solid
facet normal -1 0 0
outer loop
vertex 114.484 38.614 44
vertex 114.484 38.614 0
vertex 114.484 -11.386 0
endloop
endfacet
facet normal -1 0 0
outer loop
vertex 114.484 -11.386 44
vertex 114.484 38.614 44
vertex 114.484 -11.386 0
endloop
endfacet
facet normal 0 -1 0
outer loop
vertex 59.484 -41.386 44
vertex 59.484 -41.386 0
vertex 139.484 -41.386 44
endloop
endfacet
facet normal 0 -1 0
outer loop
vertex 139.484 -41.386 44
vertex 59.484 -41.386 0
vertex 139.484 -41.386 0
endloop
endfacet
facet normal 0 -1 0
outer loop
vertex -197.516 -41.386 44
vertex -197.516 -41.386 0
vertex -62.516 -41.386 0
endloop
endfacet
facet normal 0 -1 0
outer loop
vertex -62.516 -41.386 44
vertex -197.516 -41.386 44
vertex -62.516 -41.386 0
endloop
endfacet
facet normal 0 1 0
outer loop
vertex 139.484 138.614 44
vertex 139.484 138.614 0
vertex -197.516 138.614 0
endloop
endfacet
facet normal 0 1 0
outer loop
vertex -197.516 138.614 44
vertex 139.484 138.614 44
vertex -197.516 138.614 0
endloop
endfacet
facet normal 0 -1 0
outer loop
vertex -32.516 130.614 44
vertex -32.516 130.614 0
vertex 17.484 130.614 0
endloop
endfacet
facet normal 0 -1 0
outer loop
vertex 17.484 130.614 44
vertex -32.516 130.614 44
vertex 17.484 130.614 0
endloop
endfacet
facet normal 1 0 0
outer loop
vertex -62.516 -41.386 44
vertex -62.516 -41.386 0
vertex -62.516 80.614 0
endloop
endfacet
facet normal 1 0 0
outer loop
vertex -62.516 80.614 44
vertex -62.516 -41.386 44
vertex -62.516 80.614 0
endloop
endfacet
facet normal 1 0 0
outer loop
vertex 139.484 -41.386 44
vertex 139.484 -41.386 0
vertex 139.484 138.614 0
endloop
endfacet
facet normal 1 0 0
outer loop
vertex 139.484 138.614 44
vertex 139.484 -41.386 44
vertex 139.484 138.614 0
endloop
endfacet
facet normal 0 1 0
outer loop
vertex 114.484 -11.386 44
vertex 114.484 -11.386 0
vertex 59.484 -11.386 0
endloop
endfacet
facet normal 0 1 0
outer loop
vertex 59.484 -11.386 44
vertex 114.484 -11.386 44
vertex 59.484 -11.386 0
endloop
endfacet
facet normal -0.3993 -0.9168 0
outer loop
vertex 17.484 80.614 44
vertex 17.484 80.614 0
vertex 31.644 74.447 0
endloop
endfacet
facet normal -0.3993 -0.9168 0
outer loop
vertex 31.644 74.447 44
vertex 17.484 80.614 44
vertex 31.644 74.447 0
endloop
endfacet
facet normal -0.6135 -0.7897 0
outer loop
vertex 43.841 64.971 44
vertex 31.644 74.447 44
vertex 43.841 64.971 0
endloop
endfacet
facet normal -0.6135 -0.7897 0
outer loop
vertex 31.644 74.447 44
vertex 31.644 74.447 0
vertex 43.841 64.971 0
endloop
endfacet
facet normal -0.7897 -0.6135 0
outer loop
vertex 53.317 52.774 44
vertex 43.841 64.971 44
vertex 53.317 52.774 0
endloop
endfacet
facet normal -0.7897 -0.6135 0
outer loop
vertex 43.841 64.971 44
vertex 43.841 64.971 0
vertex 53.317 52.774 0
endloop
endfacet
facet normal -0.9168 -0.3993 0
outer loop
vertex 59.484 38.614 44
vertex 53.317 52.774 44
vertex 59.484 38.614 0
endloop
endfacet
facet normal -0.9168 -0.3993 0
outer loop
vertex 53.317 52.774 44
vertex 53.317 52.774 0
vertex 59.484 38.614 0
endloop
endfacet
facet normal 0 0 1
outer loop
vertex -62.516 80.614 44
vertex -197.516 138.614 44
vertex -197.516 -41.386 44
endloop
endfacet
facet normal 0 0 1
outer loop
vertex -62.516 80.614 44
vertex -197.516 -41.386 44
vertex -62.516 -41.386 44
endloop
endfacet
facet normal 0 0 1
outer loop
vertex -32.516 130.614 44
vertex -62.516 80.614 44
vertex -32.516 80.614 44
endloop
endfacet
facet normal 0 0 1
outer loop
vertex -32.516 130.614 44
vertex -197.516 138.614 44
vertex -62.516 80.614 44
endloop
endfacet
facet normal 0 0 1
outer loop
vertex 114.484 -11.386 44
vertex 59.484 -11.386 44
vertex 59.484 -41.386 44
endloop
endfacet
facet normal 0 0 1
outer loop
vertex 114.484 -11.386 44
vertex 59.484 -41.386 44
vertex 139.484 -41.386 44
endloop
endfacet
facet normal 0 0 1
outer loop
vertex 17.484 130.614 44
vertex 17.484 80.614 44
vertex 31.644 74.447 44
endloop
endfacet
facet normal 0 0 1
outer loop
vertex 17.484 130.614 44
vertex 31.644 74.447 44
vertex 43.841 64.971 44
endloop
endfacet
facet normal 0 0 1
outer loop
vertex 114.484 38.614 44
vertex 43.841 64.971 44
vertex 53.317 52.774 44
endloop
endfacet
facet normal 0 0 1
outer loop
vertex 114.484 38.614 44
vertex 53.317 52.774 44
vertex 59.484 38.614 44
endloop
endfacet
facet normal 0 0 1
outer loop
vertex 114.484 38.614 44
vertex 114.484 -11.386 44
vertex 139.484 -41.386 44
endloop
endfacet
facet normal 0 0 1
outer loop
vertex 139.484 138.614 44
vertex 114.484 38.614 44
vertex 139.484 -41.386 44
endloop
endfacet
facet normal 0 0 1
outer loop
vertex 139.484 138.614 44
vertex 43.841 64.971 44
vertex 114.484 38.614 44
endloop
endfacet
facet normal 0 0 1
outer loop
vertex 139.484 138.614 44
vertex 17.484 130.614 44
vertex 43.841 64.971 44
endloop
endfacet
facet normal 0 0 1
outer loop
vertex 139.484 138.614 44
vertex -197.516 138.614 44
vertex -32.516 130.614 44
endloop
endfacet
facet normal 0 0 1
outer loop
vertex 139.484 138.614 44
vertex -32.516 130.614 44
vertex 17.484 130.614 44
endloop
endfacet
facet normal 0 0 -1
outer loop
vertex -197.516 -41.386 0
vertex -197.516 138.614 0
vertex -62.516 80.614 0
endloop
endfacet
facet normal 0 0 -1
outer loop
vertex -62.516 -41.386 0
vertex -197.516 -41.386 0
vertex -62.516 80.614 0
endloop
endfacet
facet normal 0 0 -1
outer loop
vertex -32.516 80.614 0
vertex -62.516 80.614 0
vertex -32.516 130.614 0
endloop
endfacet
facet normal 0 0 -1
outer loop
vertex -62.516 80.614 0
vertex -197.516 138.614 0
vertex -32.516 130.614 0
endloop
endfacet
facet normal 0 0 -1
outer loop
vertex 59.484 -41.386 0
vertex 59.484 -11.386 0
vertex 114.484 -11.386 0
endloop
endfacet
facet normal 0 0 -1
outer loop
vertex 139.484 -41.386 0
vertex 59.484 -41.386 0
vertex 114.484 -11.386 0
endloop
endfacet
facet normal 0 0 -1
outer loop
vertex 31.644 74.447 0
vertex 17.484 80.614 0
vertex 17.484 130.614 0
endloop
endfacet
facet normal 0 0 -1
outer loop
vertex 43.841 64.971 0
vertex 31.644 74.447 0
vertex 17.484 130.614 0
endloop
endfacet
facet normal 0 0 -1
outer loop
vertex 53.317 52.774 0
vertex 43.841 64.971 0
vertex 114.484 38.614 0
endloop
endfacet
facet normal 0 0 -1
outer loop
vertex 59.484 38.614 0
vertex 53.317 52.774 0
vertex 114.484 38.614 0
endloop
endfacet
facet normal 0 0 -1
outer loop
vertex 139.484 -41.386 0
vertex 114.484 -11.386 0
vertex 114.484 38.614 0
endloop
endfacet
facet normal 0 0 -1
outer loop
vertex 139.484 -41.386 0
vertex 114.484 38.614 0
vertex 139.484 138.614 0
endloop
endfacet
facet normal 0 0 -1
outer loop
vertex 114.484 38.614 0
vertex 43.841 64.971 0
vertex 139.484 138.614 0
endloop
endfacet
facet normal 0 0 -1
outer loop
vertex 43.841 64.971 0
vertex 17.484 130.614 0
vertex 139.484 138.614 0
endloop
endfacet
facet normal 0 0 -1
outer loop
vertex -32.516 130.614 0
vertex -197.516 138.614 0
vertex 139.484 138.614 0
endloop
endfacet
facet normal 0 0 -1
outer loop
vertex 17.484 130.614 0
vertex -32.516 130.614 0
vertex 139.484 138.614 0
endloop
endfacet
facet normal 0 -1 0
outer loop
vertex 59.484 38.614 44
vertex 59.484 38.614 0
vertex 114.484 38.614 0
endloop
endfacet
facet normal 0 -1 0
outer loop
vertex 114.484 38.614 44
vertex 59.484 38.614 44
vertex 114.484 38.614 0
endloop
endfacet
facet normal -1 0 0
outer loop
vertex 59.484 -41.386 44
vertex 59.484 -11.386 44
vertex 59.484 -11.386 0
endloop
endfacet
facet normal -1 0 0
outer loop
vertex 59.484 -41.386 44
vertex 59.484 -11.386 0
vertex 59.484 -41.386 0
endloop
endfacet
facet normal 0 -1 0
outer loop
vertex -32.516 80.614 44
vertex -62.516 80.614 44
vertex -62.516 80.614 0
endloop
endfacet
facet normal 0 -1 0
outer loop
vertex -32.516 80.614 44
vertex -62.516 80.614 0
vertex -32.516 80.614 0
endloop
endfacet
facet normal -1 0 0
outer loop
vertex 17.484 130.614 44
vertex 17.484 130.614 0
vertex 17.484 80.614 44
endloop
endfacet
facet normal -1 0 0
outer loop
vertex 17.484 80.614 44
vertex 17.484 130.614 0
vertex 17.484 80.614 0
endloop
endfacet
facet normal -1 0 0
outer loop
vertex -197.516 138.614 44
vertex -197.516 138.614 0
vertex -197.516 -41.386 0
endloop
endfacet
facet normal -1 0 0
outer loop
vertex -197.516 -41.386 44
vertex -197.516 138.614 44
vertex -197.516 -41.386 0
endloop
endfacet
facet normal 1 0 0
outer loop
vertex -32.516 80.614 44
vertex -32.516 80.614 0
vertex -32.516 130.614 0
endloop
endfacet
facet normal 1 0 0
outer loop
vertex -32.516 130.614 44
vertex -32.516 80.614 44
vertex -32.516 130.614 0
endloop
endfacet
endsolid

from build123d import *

# Parameters (mm, degrees)
BOSS_EXTRUDE1_DEPTH = 44


with BuildPart() as part:
    # Sketch2 → Boss-Extrude1 (new body)
    with BuildSketch(Plane.XY):
        with BuildLine():
            Line((-62.51623719, 80.614043502), (-32.51623719, 80.614043502))
            Line((-32.51623719, 80.614043502), (-32.51623719, 130.614043502))
            Line((-32.51623719, 130.614043502), (17.48376281, 130.614043502))
            Line((17.48376281, 130.614043502), (17.48376281, 80.614043502))
            ThreePointArc((17.48376281, 80.614043502), (43.840620434, 64.970901126), (59.48376281, 38.614043502))
            Line((59.48376281, 38.614043502), (114.48376281, 38.614043502))
            Line((114.48376281, 38.614043502), (114.48376281, -11.385956498))
            Line((114.48376281, -11.385956498), (59.48376281, -11.385956498))
            Line((59.48376281, -11.385956498), (59.48376281, -41.385956498))
            Line((59.48376281, -41.385956498), (139.48376281, -41.385956498))
            Line((139.48376281, -41.385956498), (139.48376281, 138.614043502))
            Line((139.48376281, 138.614043502), (-197.51623719, 138.614043502))
            Line((-197.51623719, 138.614043502), (-197.51623719, -41.385956498))
            Line((-197.51623719, -41.385956498), (-62.51623719, -41.385956498))
            Line((-62.51623719, -41.385956498), (-62.51623719, 80.614043502))
        make_face()
    extrude(amount=BOSS_EXTRUDE1_DEPTH)


solid = part.part
